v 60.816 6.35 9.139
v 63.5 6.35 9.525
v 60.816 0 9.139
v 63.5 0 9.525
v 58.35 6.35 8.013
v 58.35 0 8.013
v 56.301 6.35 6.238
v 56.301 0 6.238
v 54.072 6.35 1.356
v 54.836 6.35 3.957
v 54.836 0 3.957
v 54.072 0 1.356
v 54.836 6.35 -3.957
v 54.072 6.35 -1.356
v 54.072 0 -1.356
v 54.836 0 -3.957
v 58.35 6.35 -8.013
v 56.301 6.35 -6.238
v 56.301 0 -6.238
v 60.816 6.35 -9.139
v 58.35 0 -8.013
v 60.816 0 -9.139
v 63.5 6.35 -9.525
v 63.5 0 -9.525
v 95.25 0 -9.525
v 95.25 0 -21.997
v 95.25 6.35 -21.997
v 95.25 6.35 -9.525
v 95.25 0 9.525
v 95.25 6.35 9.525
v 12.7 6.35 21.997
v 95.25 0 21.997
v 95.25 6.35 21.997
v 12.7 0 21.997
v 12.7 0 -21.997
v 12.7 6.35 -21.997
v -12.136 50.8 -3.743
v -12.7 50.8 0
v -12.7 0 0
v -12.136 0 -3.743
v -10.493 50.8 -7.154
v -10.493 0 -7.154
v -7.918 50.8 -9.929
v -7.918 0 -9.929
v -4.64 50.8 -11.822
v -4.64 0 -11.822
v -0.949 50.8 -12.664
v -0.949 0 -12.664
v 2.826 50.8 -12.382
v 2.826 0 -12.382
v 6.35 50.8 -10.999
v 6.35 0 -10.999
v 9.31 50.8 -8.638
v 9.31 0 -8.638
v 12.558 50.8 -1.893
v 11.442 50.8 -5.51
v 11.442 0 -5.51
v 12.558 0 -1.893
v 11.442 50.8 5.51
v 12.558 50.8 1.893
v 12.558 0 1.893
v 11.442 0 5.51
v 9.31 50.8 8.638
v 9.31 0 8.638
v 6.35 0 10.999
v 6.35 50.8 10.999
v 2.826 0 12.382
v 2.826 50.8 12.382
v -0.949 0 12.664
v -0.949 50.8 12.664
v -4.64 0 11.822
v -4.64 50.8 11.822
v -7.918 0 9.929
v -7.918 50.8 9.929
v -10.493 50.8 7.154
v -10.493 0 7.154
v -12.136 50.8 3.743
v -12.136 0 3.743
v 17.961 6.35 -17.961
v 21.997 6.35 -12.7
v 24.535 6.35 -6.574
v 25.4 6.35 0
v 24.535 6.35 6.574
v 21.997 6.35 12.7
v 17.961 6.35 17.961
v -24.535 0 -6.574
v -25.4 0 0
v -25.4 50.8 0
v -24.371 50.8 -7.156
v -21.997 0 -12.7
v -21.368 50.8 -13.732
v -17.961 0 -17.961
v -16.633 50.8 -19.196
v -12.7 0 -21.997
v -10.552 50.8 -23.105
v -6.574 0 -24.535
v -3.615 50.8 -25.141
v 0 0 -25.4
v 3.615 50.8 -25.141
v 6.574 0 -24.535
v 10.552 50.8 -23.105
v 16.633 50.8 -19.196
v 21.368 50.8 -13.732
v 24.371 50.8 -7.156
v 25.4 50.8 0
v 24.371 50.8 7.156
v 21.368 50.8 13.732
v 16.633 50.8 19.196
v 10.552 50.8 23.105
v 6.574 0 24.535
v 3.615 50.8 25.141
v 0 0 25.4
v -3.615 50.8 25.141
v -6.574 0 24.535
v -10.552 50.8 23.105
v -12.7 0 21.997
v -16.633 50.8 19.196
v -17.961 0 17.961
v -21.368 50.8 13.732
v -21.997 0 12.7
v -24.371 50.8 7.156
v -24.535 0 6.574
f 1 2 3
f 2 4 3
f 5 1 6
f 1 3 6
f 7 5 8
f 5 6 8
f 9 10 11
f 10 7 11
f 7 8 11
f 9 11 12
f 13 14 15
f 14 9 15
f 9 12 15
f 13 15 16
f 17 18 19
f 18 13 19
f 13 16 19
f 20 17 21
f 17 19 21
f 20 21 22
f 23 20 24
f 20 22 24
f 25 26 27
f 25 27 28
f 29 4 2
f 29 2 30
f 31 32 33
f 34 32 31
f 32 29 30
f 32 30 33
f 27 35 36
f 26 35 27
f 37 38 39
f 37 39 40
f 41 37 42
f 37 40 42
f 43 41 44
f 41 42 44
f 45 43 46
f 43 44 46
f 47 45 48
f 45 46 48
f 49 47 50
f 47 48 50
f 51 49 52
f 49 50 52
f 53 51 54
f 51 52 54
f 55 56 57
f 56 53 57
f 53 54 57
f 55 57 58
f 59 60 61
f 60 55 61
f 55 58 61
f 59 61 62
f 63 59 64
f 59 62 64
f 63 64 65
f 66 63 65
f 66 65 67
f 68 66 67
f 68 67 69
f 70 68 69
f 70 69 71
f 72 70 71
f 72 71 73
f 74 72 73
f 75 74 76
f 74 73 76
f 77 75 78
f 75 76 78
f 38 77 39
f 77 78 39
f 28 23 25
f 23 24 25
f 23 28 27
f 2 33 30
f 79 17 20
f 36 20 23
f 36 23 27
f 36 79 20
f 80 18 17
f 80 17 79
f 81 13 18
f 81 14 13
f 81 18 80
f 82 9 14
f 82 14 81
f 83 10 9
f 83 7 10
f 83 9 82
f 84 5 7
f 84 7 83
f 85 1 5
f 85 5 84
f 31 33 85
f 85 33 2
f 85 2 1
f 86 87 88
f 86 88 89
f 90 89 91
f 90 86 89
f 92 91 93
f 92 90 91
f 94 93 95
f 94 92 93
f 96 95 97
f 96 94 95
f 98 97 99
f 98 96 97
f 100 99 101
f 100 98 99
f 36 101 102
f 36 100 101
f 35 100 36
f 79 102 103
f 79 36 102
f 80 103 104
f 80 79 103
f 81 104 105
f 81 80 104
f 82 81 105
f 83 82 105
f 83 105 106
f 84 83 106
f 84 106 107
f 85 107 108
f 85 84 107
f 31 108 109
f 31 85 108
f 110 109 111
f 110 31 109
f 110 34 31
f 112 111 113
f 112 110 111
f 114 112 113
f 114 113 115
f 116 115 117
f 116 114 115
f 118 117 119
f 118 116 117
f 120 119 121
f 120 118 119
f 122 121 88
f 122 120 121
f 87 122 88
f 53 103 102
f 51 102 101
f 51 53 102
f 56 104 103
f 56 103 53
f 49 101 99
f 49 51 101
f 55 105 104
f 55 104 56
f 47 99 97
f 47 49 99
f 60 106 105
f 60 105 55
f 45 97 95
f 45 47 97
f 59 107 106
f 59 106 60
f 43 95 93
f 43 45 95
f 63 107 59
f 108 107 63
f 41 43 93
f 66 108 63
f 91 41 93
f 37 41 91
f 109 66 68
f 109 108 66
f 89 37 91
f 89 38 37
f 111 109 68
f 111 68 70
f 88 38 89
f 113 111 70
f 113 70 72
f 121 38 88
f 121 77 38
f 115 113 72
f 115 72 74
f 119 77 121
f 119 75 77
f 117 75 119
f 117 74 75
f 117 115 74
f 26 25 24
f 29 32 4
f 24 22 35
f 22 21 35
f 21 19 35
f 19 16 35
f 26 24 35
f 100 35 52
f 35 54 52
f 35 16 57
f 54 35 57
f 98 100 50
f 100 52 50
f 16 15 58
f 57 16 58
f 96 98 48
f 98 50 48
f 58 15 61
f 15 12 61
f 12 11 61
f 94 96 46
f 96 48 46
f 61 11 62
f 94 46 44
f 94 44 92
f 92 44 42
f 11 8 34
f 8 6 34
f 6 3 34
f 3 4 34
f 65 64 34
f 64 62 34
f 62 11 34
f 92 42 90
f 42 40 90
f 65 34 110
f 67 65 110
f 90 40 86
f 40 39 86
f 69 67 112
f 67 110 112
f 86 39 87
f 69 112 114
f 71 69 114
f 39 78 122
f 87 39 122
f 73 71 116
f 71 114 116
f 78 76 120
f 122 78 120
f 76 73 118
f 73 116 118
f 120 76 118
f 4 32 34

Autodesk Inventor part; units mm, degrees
ref_plane "YZ Plane" through (0, 0, 0) normal (1, 0, 0) x (0, 1, 0)
ref_plane "XZ Plane" through (0, 0, 0) normal (0, 1, 0) x (-1, 0, 0)
ref_plane "XY Plane" through (0, 0, 0) normal (0, 0, 1) x (1, 0, 0)
sketch "Sketch1" plane through (0, 0, 0) normal (0, 1, 0) x (-1, 0, 0)
  circle A0 centre (0, 0) radius 12.7
  circle A1 centre (0, 0) radius 25.4
  line L0 (-12.7, -21.997) -> (-95.25, -21.997)
  line L1 (-95.25, 21.997) -> (-12.7, 21.997)
  arc A2 (-63.5, -9.525) -> (-63.5, 9.525) centre (-63.5, 0) ccw
  line L2 (-63.5, 9.525) -> (-95.25, 9.525)
  line L3 (-78.5703, 0) -> (-63.5, 0) construction
  line L4 (-63.5, -9.525) -> (-95.25, -9.525)
  line L5 (-95.25, -21.997) -> (-95.25, -9.525)
  line L6 (-95.25, 9.525) -> (-95.25, 21.997)
  line L7 (-44.45, 21.997) -> (-44.45, 12.472)
  line L8 (-44.45, 12.472) -> (-22.1271, 12.472)
  line L9 (-52.07, 21.997) -> (-52.07, -21.997)
  dimension "d0" = 25.4
  dimension "d3" = 19.05
  dimension "d4" = 31.75
  dimension "d5" = 12.7
  dimension "d6" = 44.45
  dimension "d7" = 9.525
  dimension "d8" = 7.62
  dimension "d9" = 82.55
  dimension "d10" = 12.7
extrude "Extrusion3" add sketch "Sketch1" along normal blind 50.8 contours A1
extrude "Extrusion4" add sketch "Sketch1" along normal blind 6.35 contours A1 L8 L7 L1 | L0 L9 L1 L7 L8 A1 | L0 L5 L4 A2 L2 L6 L1 L9
properties part number "Distance from Face"
